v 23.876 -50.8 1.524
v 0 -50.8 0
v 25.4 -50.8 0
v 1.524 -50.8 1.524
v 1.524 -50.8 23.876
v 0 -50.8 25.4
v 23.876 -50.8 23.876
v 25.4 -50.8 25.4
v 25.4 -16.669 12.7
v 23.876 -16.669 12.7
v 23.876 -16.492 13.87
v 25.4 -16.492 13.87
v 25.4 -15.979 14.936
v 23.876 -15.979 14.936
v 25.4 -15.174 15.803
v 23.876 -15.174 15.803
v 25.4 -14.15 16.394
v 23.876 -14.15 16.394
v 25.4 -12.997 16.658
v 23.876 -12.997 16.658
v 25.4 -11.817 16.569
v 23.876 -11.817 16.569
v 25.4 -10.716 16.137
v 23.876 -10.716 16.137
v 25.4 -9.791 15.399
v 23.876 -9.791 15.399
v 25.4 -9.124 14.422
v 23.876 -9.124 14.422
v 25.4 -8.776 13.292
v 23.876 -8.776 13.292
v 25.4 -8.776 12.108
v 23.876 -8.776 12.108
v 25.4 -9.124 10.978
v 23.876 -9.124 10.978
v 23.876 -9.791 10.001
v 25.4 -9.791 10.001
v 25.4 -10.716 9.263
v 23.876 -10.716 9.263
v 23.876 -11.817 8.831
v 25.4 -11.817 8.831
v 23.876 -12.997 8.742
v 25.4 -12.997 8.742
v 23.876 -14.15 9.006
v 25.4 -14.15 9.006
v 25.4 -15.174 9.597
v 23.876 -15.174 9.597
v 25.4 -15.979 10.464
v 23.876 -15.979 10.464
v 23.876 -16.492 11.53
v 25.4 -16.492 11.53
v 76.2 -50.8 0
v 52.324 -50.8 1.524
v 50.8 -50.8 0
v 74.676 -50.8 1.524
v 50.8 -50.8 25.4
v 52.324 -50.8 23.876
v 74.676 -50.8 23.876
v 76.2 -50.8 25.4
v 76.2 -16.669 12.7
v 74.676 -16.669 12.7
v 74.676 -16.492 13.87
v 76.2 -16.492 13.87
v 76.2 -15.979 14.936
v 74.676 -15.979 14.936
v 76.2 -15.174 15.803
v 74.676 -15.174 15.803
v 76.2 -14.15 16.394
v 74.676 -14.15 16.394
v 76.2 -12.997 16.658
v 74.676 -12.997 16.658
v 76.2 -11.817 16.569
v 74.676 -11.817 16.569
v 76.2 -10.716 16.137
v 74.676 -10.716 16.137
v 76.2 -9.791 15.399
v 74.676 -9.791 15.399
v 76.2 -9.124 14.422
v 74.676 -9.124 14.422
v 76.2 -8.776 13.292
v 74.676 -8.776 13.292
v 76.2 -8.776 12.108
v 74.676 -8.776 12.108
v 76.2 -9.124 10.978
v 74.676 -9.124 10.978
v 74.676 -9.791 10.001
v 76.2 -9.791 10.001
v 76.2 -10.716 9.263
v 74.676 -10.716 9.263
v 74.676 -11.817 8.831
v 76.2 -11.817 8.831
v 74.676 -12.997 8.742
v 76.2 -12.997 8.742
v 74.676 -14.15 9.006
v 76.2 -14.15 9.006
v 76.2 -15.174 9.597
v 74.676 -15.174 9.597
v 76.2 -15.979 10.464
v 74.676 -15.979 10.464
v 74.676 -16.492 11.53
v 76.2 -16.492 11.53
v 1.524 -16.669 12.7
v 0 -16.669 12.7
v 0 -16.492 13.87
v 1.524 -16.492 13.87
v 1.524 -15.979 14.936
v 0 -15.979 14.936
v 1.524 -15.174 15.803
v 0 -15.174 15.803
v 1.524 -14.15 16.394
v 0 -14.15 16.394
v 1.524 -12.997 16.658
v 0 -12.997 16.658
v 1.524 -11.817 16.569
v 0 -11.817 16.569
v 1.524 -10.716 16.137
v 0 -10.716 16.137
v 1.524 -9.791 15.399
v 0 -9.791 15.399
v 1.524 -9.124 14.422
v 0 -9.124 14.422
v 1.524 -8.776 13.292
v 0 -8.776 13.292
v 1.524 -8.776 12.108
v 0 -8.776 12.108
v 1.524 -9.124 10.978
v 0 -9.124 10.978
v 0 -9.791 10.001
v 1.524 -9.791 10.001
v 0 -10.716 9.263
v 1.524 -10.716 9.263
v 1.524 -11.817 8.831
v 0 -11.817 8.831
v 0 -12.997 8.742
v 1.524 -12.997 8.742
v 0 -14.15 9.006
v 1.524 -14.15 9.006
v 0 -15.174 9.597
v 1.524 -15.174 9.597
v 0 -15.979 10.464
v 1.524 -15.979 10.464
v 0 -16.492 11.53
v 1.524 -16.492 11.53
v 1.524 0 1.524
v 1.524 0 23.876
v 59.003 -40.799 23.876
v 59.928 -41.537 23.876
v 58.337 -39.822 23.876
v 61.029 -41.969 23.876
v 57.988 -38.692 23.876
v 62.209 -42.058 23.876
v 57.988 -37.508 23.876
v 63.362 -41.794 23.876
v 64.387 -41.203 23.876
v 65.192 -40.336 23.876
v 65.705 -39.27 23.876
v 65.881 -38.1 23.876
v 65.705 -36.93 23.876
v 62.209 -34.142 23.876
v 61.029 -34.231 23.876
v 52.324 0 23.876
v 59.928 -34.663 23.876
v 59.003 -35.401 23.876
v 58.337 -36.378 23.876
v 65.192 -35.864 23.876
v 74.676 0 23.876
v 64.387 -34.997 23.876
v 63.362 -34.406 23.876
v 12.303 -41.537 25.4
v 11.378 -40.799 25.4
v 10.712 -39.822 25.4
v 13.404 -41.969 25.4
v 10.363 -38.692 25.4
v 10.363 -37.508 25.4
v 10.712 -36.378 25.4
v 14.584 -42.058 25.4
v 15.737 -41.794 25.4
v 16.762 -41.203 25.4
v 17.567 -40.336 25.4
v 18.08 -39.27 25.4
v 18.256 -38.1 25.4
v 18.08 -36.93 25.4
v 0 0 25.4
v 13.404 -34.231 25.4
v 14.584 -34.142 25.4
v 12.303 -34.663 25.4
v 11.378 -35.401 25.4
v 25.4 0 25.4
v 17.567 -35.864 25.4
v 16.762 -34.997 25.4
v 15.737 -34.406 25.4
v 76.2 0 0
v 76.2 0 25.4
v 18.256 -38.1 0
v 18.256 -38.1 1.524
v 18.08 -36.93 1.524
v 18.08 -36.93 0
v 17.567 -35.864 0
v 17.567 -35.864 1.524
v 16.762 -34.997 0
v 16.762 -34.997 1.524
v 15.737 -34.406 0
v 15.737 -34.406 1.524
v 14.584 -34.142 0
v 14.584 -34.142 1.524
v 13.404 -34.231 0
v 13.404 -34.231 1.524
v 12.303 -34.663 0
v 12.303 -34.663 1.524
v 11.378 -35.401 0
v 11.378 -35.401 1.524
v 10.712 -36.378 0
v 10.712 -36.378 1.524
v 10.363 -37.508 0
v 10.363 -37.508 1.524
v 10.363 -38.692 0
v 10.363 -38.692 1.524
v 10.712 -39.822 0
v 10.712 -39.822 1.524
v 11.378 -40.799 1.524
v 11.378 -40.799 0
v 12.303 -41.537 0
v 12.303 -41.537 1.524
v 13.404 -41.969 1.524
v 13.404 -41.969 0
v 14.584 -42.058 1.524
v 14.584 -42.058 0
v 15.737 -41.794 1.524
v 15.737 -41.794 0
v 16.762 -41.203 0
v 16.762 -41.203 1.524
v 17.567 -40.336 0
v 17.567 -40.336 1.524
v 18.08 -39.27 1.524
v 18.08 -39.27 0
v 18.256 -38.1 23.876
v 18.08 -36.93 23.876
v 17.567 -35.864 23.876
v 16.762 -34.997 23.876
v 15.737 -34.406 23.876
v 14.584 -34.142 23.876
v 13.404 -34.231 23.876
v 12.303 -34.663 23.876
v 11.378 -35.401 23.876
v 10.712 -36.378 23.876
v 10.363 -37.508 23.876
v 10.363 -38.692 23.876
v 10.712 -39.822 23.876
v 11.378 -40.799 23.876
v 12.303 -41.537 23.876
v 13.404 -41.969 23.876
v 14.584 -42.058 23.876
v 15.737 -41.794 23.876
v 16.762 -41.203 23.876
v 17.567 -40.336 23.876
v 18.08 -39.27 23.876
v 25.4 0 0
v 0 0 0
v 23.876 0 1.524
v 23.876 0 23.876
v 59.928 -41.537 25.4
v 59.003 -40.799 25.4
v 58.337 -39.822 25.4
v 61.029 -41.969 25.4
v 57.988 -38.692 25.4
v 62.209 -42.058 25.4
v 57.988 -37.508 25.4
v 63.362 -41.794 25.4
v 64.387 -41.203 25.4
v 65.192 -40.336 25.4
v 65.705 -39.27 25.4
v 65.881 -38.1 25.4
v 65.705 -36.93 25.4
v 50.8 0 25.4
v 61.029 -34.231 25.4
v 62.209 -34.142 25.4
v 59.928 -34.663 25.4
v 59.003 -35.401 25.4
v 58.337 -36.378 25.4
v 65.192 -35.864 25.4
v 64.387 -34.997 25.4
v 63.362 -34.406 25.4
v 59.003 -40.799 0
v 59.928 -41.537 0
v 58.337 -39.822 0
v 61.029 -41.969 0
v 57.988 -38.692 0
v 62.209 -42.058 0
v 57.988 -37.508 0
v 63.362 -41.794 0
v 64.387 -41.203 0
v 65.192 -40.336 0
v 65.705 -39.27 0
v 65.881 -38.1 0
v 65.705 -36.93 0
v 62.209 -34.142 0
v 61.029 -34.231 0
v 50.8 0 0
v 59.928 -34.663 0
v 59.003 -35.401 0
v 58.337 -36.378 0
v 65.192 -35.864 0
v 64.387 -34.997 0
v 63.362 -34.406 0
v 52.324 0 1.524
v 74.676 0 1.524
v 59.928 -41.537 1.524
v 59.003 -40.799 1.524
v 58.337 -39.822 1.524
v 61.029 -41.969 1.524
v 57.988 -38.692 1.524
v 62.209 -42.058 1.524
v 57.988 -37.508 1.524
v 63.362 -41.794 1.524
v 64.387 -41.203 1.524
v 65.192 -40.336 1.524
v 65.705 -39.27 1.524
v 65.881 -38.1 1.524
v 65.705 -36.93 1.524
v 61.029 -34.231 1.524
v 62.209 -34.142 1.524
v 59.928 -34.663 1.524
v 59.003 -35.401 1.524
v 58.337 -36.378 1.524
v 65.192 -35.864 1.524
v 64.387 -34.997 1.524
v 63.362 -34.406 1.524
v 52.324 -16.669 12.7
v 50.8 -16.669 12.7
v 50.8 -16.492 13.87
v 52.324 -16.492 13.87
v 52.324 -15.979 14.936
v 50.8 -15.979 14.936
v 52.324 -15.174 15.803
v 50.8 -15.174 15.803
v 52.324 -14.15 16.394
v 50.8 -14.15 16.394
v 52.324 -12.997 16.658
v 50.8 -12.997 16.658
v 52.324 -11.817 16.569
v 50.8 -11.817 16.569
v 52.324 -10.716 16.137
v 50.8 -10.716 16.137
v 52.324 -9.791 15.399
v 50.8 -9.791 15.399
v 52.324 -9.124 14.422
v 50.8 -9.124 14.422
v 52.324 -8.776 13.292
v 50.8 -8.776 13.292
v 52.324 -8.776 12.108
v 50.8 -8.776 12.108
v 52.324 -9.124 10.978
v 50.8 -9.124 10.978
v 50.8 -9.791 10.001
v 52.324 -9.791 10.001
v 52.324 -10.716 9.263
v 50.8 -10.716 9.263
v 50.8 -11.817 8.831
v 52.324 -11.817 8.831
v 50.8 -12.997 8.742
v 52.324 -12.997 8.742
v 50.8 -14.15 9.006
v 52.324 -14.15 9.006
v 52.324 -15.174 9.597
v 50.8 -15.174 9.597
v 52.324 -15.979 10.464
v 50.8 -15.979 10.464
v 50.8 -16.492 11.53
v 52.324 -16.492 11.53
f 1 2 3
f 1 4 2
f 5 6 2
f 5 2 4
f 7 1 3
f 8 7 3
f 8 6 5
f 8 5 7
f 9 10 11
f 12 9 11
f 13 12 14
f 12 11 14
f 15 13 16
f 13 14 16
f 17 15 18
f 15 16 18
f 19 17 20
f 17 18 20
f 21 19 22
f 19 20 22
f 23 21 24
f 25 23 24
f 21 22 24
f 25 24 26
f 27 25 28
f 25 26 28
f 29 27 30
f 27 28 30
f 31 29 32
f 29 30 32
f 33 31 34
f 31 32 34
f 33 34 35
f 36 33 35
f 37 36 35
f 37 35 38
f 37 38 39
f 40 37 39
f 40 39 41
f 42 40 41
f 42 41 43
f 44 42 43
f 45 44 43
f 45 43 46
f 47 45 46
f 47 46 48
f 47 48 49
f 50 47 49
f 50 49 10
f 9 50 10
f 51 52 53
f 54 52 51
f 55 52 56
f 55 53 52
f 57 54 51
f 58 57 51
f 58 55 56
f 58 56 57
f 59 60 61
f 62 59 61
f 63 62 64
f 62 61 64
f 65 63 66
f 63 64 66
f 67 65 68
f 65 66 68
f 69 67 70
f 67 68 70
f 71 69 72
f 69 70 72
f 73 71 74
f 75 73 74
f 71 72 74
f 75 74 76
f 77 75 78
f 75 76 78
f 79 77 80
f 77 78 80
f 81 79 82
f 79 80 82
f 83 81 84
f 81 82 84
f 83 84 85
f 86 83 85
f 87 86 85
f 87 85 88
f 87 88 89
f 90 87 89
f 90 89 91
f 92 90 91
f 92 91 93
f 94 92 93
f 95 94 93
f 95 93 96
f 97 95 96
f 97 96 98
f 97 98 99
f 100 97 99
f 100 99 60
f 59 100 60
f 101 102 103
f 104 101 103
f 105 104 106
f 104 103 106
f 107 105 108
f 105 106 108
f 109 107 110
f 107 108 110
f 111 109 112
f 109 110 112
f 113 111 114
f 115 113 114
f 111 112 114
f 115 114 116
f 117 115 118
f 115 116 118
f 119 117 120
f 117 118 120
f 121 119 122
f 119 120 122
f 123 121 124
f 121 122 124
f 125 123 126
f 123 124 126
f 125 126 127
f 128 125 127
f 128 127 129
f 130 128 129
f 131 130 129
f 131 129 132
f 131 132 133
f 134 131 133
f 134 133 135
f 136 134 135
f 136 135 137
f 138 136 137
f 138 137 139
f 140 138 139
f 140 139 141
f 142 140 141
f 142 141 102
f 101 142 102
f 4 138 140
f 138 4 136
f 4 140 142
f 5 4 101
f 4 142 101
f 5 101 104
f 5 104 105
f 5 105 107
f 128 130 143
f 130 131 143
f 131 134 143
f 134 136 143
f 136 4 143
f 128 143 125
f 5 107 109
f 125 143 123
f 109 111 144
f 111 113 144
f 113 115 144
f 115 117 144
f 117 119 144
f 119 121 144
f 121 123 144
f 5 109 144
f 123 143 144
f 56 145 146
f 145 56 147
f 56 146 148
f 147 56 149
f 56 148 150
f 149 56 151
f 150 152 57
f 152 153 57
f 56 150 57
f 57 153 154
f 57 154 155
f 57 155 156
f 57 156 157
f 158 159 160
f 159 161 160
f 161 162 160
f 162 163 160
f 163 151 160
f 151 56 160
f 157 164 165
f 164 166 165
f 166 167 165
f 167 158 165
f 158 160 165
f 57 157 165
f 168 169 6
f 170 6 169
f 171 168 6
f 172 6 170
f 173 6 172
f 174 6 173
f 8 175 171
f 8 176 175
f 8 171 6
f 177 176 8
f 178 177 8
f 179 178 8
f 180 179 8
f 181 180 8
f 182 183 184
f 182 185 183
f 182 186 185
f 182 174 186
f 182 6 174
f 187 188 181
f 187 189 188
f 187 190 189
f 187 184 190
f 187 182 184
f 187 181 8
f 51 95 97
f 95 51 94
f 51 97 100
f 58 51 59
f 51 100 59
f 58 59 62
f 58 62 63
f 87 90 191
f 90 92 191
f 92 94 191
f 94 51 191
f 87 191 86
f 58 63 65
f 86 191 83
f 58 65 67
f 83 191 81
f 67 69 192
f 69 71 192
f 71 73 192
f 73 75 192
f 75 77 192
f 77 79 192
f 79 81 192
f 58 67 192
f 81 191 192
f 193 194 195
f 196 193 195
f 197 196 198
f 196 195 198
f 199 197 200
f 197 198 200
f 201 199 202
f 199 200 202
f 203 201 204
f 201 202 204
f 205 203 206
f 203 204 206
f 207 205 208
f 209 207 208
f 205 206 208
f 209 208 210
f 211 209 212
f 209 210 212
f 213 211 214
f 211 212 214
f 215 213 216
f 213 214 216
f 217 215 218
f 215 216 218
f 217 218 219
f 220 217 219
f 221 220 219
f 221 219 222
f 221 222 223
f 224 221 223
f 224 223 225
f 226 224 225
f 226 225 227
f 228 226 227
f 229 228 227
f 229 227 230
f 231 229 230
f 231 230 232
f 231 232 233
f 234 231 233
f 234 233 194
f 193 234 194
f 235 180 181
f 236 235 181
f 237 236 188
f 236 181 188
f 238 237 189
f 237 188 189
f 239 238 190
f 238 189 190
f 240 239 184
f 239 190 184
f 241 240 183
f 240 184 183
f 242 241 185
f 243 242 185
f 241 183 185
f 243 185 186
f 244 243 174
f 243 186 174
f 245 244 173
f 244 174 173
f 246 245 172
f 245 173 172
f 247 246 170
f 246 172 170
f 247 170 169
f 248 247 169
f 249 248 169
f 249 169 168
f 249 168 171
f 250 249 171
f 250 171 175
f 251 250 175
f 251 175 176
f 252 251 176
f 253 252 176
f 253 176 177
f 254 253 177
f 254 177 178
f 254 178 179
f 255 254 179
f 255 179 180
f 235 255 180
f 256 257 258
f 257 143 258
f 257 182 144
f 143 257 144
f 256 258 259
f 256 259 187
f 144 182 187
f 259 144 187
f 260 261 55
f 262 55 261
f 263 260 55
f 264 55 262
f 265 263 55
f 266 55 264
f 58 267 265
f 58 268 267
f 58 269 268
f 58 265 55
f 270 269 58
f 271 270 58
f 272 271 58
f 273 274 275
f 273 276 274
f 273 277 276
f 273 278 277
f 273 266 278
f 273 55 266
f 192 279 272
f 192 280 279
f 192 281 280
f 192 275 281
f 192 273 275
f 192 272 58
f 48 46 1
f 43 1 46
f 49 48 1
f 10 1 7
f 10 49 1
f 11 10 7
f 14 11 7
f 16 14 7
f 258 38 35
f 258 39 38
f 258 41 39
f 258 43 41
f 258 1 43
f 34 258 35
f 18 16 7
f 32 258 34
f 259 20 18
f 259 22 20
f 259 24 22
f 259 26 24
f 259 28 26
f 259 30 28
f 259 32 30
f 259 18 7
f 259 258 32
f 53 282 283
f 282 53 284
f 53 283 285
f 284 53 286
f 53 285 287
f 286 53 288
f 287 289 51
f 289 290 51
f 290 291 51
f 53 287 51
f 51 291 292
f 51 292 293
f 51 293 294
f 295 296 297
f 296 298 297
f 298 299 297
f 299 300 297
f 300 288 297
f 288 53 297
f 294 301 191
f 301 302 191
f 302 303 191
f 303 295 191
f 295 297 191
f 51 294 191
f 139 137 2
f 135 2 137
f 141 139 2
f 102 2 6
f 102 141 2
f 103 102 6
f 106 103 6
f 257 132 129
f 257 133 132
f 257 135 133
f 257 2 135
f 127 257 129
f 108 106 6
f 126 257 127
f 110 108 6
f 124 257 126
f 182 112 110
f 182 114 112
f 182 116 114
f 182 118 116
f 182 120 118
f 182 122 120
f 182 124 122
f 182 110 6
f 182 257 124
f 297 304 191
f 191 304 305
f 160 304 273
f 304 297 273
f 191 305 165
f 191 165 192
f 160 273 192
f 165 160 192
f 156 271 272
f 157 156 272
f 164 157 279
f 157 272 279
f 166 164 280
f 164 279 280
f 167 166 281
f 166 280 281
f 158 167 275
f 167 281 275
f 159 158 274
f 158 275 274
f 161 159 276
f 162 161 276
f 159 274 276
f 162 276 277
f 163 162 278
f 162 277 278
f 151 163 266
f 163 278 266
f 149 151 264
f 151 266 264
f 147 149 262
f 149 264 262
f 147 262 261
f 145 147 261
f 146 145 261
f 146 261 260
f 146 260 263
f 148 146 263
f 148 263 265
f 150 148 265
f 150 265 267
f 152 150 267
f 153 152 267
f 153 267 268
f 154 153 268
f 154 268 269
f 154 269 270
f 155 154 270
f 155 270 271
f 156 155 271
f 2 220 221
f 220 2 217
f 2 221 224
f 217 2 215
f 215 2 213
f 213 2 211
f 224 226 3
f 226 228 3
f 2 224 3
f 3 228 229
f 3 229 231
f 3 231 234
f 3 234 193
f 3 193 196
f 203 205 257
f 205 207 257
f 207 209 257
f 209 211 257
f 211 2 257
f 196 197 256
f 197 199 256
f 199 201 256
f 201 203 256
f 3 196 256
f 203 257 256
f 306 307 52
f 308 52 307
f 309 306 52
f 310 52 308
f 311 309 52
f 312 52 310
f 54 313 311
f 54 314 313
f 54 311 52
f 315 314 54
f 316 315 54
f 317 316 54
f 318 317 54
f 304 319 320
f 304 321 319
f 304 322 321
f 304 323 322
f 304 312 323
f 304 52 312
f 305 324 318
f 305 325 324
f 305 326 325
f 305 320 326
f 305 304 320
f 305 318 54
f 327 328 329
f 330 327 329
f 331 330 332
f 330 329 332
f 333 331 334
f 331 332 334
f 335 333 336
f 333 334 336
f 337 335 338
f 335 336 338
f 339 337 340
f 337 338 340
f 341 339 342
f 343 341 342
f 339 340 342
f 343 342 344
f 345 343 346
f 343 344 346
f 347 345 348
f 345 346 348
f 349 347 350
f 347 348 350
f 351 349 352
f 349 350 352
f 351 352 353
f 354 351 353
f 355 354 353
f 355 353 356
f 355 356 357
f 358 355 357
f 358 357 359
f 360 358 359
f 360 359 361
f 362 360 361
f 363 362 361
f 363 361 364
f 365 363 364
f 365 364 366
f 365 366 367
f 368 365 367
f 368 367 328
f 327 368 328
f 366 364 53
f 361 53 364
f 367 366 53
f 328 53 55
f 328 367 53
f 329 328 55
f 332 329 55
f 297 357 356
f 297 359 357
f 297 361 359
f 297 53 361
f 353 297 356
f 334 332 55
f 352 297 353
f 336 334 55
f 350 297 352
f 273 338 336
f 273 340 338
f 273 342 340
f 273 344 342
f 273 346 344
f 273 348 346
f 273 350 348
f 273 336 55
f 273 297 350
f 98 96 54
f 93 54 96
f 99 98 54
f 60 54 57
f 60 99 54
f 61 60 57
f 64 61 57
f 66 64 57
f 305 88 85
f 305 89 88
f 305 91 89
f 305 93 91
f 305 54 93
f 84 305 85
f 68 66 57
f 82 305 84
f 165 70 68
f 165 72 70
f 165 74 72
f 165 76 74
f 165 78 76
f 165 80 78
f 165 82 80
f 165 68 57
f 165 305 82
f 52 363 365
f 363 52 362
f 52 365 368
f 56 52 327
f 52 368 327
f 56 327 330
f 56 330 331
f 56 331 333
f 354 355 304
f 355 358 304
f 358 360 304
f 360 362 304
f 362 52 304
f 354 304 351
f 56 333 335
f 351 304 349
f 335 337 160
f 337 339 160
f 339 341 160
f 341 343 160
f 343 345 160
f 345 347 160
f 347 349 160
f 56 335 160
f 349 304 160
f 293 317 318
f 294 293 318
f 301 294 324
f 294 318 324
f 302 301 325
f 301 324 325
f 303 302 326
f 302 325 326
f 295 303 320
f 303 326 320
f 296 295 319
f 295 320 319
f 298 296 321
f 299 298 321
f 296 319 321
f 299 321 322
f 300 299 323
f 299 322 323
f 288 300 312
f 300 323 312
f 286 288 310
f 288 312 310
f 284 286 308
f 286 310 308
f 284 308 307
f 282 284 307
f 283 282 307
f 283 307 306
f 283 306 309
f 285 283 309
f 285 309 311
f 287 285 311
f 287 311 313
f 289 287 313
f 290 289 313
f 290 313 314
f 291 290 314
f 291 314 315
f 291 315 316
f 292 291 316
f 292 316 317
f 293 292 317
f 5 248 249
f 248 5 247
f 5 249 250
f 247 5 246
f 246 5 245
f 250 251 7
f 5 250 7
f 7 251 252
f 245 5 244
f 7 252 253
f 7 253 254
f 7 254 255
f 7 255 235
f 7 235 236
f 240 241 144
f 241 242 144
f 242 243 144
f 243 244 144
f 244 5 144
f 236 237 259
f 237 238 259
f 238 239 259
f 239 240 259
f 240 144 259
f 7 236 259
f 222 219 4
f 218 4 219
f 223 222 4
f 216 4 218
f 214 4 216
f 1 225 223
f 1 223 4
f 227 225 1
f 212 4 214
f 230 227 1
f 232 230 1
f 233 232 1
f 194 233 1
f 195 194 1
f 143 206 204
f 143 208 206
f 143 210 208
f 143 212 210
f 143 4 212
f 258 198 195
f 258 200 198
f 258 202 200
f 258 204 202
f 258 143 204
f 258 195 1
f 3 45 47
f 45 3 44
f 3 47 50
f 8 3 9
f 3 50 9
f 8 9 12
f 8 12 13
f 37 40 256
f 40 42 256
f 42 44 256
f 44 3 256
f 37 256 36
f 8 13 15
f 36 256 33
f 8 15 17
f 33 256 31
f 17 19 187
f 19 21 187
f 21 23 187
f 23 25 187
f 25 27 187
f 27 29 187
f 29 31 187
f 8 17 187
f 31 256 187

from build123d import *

# Parameters (mm, degrees)
F0_W     = 25.4
F0_H     = 25.4
F0_W_2   = 22.352
F0_H_2   = 22.352
F1_DEPTH = 50.8
F2_R     = 3.96875
F3_DEPTH = 25.401
F4_R     = 3.96875
F5_DEPTH = 76.201


with BuildPart() as f1:
    # F0 (on Front) → F1 (new body)
    with BuildSketch(Plane.XZ):
        with Locations((12.7, 12.7)):
            Rectangle(F0_W, F0_H)
        with Locations((12.7, 12.7)):
            Rectangle(F0_W_2, F0_H_2, mode=Mode.SUBTRACT)
        with Locations((63.5, 12.7)):
            Rectangle(F0_W, F0_H)
        with Locations((63.5, 12.7)):
            Rectangle(F0_W_2, F0_H_2, mode=Mode.SUBTRACT)
    extrude(amount=F1_DEPTH)

    # F2 (on face) → F3 (cut, through all)
    with BuildSketch(Plane.XY.offset(25.4)):
        with Locations((14.2875, -38.1)):
            Circle(F2_R)
        with Locations((61.9125, -38.1)):
            Circle(F2_R)
    extrude(amount=-F3_DEPTH, mode=Mode.SUBTRACT)

    # F4 (on face) → F5 (cut, through all)
    with BuildSketch(Plane(origin=(0, 0, 0), x_dir=(0, -1, 0), z_dir=(-1, 0, 0))):
        with Locations((12.7, 12.7)):
            Circle(F4_R)
    extrude(amount=-F5_DEPTH, mode=Mode.SUBTRACT)


solid = f1.part
